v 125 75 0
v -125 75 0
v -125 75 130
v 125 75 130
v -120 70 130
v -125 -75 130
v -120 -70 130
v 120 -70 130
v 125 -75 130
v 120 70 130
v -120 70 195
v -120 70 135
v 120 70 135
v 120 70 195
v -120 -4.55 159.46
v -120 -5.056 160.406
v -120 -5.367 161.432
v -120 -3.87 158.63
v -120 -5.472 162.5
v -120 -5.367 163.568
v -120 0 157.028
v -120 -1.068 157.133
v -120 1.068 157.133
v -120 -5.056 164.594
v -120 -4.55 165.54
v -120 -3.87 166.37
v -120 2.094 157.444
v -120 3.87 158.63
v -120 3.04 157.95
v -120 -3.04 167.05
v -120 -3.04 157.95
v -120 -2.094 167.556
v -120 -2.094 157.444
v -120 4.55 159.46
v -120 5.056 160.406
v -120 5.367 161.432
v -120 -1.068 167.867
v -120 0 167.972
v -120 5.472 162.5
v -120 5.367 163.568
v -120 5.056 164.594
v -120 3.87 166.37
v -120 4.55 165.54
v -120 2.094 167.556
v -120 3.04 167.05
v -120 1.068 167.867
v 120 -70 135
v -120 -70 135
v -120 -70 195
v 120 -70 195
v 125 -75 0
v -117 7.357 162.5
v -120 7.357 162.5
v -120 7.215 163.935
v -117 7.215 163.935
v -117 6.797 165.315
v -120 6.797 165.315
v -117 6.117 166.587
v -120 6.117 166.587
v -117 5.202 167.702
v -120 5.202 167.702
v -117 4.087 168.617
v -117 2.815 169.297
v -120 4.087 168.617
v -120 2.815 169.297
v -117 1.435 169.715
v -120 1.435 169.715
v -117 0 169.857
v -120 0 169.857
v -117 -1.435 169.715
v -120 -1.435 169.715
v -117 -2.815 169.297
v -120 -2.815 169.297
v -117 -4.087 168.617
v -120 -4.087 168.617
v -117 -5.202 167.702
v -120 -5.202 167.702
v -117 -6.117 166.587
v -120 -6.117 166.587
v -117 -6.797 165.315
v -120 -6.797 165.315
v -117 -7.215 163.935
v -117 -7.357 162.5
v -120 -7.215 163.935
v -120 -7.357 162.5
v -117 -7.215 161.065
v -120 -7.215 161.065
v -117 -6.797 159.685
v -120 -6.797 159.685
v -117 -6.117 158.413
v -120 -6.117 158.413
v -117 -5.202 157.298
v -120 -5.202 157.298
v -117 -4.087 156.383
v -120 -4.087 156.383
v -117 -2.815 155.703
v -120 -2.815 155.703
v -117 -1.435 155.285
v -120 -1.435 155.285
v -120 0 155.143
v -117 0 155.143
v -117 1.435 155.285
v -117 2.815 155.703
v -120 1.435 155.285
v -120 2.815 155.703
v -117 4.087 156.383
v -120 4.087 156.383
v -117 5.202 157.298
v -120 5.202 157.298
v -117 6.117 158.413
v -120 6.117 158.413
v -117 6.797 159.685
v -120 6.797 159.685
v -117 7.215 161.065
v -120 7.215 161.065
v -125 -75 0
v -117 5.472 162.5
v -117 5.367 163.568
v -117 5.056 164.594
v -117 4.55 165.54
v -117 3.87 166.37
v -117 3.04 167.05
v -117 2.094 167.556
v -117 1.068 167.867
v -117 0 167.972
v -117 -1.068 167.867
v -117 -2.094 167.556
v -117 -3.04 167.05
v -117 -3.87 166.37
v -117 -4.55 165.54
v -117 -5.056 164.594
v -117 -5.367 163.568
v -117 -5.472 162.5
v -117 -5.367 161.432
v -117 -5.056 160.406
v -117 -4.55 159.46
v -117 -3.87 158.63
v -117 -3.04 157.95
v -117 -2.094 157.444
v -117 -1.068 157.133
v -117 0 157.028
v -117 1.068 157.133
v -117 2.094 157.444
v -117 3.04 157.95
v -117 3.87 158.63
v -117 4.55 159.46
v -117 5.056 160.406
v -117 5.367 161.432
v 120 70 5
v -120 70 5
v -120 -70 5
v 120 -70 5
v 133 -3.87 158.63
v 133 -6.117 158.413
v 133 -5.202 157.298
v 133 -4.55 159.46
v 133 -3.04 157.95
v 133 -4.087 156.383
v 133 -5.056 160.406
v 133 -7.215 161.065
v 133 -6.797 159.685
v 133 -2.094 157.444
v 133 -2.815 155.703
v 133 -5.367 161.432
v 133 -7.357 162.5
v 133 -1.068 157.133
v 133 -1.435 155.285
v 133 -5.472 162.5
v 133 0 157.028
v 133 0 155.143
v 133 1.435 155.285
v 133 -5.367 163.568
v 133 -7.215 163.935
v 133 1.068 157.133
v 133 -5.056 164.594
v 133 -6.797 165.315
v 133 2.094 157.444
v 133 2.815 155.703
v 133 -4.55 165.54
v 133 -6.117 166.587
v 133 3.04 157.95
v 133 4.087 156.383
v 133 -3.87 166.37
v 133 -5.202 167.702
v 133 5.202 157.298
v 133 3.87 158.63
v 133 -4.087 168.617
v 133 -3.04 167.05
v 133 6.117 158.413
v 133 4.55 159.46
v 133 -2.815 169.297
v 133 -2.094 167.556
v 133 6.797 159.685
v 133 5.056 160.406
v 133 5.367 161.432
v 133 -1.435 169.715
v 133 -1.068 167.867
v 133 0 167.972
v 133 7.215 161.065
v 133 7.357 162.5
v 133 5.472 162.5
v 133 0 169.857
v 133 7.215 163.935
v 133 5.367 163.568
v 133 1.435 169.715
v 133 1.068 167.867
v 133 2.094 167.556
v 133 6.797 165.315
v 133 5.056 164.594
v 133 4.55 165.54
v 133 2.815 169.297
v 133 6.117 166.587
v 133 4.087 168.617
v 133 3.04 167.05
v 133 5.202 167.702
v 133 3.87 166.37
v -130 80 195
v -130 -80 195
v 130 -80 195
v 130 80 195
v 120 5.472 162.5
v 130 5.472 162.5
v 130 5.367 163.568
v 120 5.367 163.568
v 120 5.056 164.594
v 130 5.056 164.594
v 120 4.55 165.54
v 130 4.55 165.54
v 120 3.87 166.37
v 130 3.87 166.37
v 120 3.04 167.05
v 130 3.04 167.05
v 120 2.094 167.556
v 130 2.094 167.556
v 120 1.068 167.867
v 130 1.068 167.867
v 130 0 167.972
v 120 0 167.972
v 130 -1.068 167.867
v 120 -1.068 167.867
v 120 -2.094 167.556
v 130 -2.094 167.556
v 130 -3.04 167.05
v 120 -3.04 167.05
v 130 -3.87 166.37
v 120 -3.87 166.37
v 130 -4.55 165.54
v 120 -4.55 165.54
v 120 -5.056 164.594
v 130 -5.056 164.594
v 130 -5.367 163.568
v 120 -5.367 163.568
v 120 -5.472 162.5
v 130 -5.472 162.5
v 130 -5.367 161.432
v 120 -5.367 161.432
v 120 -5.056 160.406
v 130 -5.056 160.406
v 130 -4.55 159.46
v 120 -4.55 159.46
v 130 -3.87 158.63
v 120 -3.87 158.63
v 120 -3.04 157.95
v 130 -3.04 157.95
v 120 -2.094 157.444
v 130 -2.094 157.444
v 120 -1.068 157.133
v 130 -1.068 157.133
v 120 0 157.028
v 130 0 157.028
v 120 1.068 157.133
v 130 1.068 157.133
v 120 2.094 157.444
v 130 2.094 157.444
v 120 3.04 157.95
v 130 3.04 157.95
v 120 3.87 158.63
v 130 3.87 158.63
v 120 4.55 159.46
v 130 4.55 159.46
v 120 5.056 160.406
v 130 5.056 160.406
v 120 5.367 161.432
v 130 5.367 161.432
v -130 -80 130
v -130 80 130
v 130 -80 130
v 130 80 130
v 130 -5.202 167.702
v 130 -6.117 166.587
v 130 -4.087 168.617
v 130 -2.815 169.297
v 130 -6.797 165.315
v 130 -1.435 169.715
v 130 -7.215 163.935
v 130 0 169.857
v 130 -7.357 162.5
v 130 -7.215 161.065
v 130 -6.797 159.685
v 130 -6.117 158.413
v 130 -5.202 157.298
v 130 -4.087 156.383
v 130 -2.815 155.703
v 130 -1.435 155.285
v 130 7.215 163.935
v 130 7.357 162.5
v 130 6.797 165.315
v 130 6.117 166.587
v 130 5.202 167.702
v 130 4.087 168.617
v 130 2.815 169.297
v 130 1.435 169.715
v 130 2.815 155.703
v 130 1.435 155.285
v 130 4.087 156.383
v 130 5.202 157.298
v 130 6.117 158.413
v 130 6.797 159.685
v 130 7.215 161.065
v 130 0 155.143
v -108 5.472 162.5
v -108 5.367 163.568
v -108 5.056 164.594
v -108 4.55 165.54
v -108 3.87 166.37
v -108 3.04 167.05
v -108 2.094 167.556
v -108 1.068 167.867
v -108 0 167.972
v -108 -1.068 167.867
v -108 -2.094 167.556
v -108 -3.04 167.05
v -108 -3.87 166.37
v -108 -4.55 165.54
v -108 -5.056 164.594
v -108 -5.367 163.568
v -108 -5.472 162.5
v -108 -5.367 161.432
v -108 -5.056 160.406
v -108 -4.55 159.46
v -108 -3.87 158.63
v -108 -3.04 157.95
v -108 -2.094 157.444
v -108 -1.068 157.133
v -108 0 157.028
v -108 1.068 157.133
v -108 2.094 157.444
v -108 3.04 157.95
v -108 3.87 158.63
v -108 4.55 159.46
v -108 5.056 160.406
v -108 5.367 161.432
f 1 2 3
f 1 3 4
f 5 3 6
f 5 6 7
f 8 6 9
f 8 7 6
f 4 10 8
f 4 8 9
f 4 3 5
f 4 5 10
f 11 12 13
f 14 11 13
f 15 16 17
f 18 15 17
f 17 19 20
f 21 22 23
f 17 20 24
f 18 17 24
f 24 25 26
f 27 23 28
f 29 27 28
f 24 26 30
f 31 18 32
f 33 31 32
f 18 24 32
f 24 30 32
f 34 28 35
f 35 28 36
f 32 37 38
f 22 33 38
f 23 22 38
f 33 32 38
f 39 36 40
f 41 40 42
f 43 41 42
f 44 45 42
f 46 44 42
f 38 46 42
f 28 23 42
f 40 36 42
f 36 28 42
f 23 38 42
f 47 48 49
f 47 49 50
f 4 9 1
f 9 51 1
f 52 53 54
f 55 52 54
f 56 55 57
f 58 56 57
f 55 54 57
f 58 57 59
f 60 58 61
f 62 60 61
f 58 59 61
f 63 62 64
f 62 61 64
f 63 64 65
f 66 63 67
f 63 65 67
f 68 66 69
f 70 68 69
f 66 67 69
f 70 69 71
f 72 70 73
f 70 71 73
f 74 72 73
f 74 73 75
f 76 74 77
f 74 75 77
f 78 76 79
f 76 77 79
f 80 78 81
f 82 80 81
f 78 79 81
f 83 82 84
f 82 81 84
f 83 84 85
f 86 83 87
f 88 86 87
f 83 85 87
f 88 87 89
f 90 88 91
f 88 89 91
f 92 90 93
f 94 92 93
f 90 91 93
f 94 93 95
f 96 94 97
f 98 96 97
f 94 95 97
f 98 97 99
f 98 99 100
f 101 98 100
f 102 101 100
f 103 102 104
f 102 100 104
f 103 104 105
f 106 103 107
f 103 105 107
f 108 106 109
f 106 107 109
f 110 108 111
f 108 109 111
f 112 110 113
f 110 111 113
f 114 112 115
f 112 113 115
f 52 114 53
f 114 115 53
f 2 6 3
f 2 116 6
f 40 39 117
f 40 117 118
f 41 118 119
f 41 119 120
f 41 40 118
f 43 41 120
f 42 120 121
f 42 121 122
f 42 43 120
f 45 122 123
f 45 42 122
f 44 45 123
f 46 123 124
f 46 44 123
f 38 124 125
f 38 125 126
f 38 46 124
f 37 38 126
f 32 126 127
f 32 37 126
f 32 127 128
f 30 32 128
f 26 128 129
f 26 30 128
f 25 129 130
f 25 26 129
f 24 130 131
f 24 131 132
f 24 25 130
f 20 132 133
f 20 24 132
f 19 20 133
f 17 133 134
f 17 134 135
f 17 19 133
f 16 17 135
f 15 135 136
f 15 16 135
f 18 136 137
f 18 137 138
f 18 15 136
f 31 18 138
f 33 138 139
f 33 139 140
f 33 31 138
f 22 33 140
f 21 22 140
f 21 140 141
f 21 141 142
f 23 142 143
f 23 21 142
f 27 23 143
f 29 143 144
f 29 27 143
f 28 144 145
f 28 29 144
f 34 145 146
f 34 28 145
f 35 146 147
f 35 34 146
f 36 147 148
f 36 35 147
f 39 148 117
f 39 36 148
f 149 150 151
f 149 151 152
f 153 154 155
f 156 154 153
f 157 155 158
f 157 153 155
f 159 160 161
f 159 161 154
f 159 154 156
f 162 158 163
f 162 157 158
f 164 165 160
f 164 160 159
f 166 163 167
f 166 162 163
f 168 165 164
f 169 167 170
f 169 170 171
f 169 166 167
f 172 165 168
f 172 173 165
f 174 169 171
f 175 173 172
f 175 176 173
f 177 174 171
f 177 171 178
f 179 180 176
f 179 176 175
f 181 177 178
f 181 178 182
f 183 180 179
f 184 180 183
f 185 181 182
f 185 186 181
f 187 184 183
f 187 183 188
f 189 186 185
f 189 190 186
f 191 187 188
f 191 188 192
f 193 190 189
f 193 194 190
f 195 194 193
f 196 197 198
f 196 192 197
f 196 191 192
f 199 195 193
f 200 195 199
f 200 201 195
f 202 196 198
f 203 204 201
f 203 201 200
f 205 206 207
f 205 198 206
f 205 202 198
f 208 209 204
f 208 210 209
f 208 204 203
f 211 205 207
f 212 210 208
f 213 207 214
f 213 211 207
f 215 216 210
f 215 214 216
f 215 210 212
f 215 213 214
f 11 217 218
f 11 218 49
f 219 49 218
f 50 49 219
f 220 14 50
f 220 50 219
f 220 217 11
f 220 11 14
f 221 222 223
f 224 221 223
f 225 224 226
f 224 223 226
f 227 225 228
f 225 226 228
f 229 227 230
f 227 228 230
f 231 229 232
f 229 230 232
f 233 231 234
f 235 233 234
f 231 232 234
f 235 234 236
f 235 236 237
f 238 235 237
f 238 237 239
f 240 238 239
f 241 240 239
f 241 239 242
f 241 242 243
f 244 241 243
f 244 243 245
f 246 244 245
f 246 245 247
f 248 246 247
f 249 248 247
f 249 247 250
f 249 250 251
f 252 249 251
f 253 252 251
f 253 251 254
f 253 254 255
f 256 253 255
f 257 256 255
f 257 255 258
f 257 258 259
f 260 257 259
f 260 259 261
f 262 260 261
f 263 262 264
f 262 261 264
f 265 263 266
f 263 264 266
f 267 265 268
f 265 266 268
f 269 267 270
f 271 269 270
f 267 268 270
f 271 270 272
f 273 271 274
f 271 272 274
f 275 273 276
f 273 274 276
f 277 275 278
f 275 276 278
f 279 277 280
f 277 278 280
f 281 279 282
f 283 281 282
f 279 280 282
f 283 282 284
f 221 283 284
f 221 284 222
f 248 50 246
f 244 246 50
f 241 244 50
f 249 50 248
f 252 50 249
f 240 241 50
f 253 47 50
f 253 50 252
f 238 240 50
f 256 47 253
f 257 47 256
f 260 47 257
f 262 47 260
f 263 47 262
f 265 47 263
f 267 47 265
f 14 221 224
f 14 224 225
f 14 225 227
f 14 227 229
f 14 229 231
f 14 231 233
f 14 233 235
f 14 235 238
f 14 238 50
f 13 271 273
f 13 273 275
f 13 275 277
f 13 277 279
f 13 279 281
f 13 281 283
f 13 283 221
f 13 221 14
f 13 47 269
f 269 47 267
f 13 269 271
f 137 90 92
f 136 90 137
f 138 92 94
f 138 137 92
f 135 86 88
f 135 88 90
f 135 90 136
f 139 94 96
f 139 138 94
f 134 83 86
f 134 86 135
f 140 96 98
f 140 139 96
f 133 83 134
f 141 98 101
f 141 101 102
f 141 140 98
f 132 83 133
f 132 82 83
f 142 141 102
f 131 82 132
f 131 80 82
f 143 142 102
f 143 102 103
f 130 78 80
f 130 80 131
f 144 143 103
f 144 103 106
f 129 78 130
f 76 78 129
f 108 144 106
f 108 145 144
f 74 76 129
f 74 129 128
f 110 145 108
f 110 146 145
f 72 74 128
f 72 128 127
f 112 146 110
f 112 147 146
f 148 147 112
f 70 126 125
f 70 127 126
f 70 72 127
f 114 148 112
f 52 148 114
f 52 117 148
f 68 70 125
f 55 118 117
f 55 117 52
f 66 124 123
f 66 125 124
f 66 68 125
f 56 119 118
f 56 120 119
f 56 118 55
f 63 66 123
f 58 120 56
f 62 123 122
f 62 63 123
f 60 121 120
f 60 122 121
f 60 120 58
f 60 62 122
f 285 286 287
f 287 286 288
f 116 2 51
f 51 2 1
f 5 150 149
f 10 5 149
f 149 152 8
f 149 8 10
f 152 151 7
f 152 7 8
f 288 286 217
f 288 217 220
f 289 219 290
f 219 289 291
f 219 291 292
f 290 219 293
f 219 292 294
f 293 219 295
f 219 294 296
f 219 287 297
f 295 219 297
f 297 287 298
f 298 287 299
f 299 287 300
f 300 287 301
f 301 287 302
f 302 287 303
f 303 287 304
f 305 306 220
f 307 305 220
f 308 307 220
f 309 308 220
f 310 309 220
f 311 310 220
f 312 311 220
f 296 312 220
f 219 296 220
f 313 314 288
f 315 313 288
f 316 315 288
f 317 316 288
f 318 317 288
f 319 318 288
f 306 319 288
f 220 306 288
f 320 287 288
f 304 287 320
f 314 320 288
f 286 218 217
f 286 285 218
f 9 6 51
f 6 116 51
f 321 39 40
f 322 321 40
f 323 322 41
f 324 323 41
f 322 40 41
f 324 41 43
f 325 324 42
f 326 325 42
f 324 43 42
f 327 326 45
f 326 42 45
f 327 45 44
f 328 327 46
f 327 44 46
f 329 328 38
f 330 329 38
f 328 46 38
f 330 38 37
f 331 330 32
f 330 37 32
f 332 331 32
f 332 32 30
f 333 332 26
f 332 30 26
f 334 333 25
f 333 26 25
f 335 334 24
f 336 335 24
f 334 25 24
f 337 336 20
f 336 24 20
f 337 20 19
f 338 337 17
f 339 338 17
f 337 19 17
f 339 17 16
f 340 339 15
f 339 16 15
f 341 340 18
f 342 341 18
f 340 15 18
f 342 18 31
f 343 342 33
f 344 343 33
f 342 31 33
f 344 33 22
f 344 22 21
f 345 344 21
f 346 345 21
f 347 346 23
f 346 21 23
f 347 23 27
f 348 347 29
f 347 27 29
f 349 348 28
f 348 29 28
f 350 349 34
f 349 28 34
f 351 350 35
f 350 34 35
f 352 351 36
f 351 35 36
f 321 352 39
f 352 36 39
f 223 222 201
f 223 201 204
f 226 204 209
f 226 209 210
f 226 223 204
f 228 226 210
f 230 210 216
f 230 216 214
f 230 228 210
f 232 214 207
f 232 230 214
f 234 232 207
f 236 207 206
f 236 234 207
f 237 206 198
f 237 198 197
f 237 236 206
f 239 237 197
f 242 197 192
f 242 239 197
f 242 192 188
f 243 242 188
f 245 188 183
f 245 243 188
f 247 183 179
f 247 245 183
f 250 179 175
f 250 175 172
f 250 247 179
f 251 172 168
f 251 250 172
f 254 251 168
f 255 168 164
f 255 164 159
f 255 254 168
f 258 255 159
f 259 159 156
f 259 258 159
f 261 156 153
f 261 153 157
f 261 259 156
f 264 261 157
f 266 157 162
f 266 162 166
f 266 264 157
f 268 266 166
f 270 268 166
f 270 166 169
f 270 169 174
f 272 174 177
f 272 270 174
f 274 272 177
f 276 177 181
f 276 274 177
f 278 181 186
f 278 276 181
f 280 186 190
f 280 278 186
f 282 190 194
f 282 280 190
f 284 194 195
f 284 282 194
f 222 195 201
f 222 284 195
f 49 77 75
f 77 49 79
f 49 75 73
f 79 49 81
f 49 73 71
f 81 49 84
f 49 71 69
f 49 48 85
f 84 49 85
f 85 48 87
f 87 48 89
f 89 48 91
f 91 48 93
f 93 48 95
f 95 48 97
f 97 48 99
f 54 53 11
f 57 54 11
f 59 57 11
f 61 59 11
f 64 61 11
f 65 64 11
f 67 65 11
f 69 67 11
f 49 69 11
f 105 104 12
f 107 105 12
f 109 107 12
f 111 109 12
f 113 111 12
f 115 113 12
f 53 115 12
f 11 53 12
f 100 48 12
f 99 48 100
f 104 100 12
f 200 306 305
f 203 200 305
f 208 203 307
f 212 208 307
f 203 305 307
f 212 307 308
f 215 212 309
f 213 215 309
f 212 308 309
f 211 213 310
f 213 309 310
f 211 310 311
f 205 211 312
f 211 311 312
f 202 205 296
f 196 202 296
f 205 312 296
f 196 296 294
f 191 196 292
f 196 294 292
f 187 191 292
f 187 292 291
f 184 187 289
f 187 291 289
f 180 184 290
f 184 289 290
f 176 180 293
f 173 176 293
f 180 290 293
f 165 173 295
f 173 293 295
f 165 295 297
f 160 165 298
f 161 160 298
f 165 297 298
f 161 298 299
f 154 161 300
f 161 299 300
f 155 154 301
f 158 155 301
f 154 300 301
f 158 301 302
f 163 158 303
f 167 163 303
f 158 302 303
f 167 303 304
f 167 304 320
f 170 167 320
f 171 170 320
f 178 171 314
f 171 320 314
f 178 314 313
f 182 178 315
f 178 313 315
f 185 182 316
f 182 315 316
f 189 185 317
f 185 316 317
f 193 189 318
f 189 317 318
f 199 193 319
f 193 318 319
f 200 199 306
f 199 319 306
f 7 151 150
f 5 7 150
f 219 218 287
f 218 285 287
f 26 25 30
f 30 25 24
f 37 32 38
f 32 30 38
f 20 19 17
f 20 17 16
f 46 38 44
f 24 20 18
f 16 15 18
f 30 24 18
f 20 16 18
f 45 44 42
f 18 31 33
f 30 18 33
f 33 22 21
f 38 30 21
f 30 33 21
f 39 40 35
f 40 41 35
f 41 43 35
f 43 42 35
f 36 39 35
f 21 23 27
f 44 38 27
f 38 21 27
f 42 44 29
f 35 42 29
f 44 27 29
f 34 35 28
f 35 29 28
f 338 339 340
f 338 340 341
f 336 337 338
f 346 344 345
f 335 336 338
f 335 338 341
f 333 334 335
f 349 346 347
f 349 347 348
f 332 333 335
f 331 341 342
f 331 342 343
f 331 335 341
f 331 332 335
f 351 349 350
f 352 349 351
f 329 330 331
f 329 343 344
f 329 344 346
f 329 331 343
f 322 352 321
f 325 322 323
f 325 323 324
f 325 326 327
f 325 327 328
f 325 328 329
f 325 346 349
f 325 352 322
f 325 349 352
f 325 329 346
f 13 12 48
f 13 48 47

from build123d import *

# Parameters (mm, degrees)
F0_W      = 250
F0_H      = 150
F1_DEPTH  = 5
F2_W      = 250
F2_H      = 150
F2_W_2    = 240
F2_H_2    = 140
F3_DEPTH  = 125
F4_W      = 260
F4_H      = 160
F5_DEPTH  = 5
F6_W      = 260
F6_H      = 160
F6_W_2    = 240
F6_H_2    = 140
F7_DEPTH  = 60
F8_R      = 5.472412
F9_DEPTH  = 25
F10_R     = 7.356658
F10_R_2   = 5.472412
F11_DEPTH = 3
F12_R     = 7.356658
F12_R_2   = 5.472412
F13_DEPTH = 3
F15_R     = 5.472412
F16_DEPTH = 12


with BuildPart() as f1:
    # F0 (on Top) → F1 (new body)
    with BuildSketch(Plane.XY):
        Rectangle(F0_W, F0_H)
    extrude(amount=F1_DEPTH)

    # F2 (on face) → F3 (join)
    with BuildSketch(Plane.XY.offset(5)):
        Rectangle(F2_W, F2_H)
        Rectangle(F2_W_2, F2_H_2, mode=Mode.SUBTRACT)
    extrude(amount=F3_DEPTH)


with BuildPart() as f5:
    # F4 (on face) → F5 (new body)
    with BuildSketch(Plane.XY.offset(130)):
        Rectangle(F4_W, F4_H)
    extrude(amount=F5_DEPTH)

    # F6 (on face) → F7 (join)
    with BuildSketch(Plane.XY.offset(135)):
        Rectangle(F6_W, F6_H)
        Rectangle(F6_W_2, F6_H_2, mode=Mode.SUBTRACT)
    extrude(amount=F7_DEPTH)

    # F8 (on face) → F9 (cut)
    with BuildSketch(Plane.YZ.offset(130)):
        with Locations((0, 162.5)):
            Circle(F8_R)
    extrude(amount=-F9_DEPTH, mode=Mode.SUBTRACT)

    # F10 (on face) → F11 (join)
    with BuildSketch(Plane.YZ.offset(130)):
        with Locations((0, 162.5)):
            Circle(F10_R)
        with Locations((0, 162.5)):
            Circle(F10_R_2, mode=Mode.SUBTRACT)
    extrude(amount=F11_DEPTH)

    # F12 (on face) → F13 (join)
    with BuildSketch(Plane.YZ.offset(-120)):
        with Locations((0, 162.5)):
            Circle(F12_R)
        with Locations((0, 162.5)):
            Circle(F12_R_2, mode=Mode.SUBTRACT)
    extrude(amount=F13_DEPTH)


with BuildPart() as f16:
    # F15 (on face) → F16 (new body)
    with BuildSketch(Plane.YZ.offset(-120)):
        with Locations((0, 162.5)):
            Circle(F15_R)
    extrude(amount=F16_DEPTH)


solid = Compound([f1.part, f5.part, f16.part])
